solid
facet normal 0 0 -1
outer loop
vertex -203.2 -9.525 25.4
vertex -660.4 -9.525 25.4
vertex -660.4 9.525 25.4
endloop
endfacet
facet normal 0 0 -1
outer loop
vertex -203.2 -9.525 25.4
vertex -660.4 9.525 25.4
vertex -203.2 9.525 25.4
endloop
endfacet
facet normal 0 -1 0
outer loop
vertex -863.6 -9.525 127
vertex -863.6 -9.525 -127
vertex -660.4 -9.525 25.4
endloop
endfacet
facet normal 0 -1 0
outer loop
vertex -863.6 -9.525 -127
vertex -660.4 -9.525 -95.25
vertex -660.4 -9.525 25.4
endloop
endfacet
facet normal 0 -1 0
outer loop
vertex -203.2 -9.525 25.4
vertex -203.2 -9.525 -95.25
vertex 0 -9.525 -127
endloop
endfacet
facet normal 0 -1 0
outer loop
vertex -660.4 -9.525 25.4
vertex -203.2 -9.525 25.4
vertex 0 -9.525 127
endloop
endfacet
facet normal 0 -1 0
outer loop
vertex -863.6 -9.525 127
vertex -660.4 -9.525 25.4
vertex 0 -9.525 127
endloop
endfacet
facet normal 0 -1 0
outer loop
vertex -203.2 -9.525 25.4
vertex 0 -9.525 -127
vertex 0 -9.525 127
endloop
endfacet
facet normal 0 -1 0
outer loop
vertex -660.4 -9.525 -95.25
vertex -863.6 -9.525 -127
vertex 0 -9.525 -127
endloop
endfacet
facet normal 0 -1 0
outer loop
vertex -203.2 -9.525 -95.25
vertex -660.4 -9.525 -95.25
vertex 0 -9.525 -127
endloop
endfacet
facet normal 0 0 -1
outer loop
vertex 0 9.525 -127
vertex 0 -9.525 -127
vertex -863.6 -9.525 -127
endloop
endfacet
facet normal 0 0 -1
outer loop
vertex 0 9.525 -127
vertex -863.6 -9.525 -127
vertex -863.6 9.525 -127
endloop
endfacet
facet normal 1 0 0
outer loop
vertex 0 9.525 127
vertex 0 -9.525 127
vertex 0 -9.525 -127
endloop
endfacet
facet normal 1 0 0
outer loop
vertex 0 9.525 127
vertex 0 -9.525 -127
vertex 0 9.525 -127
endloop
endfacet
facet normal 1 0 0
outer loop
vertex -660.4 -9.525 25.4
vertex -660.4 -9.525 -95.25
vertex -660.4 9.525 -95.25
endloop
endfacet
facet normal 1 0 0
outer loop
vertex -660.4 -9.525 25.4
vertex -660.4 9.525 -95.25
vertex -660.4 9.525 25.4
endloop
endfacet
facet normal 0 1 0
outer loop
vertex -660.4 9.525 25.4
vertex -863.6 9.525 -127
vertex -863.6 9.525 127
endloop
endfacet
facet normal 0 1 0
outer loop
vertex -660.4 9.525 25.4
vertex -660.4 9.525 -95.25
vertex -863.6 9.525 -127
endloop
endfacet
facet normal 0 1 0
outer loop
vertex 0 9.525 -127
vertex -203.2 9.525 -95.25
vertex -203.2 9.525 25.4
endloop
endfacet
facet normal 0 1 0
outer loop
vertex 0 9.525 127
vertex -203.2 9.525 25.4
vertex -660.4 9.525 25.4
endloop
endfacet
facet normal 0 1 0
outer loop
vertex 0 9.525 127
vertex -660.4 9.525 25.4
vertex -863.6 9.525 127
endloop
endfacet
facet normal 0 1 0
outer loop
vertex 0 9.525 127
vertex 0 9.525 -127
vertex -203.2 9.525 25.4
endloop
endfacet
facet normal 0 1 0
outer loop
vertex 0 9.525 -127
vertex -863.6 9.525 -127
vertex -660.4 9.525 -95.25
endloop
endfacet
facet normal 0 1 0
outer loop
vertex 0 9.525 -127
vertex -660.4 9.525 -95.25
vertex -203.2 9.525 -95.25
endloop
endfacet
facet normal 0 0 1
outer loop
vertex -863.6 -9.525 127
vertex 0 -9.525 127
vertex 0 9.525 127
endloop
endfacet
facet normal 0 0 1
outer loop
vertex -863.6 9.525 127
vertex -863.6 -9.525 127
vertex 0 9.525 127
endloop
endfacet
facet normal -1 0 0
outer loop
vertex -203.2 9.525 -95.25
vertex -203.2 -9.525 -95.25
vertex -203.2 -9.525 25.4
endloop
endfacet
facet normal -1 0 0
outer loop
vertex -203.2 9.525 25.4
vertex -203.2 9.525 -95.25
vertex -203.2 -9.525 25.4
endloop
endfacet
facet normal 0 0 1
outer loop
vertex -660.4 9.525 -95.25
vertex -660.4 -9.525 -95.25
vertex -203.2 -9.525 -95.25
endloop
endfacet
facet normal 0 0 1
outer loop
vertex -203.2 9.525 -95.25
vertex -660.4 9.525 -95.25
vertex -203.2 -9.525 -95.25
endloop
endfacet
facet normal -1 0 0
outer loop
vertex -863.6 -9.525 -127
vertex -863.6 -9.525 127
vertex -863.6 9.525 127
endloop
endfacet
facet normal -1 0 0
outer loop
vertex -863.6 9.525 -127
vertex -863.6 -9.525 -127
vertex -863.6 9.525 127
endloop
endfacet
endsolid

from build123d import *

# Parameters (mm, degrees)
F0_W     = 19.05
F0_H     = 254
F1_DEPTH = 863.6
F2_W     = 457.2
F2_H     = 120.65
F3_DEPTH = 19.051


with BuildPart() as f1:
    # F0 (on Right) → F1 (new body)
    with BuildSketch(Plane.YZ):
        Rectangle(F0_W, F0_H)
    extrude(amount=-F1_DEPTH)

    # F2 (on face) → F3 (cut, through all)
    with BuildSketch(Plane.XZ.offset(9.525)):
        with Locations((-431.8, -34.925)):
            Rectangle(F2_W, F2_H)
    extrude(amount=-F3_DEPTH, mode=Mode.SUBTRACT)


solid = f1.part
